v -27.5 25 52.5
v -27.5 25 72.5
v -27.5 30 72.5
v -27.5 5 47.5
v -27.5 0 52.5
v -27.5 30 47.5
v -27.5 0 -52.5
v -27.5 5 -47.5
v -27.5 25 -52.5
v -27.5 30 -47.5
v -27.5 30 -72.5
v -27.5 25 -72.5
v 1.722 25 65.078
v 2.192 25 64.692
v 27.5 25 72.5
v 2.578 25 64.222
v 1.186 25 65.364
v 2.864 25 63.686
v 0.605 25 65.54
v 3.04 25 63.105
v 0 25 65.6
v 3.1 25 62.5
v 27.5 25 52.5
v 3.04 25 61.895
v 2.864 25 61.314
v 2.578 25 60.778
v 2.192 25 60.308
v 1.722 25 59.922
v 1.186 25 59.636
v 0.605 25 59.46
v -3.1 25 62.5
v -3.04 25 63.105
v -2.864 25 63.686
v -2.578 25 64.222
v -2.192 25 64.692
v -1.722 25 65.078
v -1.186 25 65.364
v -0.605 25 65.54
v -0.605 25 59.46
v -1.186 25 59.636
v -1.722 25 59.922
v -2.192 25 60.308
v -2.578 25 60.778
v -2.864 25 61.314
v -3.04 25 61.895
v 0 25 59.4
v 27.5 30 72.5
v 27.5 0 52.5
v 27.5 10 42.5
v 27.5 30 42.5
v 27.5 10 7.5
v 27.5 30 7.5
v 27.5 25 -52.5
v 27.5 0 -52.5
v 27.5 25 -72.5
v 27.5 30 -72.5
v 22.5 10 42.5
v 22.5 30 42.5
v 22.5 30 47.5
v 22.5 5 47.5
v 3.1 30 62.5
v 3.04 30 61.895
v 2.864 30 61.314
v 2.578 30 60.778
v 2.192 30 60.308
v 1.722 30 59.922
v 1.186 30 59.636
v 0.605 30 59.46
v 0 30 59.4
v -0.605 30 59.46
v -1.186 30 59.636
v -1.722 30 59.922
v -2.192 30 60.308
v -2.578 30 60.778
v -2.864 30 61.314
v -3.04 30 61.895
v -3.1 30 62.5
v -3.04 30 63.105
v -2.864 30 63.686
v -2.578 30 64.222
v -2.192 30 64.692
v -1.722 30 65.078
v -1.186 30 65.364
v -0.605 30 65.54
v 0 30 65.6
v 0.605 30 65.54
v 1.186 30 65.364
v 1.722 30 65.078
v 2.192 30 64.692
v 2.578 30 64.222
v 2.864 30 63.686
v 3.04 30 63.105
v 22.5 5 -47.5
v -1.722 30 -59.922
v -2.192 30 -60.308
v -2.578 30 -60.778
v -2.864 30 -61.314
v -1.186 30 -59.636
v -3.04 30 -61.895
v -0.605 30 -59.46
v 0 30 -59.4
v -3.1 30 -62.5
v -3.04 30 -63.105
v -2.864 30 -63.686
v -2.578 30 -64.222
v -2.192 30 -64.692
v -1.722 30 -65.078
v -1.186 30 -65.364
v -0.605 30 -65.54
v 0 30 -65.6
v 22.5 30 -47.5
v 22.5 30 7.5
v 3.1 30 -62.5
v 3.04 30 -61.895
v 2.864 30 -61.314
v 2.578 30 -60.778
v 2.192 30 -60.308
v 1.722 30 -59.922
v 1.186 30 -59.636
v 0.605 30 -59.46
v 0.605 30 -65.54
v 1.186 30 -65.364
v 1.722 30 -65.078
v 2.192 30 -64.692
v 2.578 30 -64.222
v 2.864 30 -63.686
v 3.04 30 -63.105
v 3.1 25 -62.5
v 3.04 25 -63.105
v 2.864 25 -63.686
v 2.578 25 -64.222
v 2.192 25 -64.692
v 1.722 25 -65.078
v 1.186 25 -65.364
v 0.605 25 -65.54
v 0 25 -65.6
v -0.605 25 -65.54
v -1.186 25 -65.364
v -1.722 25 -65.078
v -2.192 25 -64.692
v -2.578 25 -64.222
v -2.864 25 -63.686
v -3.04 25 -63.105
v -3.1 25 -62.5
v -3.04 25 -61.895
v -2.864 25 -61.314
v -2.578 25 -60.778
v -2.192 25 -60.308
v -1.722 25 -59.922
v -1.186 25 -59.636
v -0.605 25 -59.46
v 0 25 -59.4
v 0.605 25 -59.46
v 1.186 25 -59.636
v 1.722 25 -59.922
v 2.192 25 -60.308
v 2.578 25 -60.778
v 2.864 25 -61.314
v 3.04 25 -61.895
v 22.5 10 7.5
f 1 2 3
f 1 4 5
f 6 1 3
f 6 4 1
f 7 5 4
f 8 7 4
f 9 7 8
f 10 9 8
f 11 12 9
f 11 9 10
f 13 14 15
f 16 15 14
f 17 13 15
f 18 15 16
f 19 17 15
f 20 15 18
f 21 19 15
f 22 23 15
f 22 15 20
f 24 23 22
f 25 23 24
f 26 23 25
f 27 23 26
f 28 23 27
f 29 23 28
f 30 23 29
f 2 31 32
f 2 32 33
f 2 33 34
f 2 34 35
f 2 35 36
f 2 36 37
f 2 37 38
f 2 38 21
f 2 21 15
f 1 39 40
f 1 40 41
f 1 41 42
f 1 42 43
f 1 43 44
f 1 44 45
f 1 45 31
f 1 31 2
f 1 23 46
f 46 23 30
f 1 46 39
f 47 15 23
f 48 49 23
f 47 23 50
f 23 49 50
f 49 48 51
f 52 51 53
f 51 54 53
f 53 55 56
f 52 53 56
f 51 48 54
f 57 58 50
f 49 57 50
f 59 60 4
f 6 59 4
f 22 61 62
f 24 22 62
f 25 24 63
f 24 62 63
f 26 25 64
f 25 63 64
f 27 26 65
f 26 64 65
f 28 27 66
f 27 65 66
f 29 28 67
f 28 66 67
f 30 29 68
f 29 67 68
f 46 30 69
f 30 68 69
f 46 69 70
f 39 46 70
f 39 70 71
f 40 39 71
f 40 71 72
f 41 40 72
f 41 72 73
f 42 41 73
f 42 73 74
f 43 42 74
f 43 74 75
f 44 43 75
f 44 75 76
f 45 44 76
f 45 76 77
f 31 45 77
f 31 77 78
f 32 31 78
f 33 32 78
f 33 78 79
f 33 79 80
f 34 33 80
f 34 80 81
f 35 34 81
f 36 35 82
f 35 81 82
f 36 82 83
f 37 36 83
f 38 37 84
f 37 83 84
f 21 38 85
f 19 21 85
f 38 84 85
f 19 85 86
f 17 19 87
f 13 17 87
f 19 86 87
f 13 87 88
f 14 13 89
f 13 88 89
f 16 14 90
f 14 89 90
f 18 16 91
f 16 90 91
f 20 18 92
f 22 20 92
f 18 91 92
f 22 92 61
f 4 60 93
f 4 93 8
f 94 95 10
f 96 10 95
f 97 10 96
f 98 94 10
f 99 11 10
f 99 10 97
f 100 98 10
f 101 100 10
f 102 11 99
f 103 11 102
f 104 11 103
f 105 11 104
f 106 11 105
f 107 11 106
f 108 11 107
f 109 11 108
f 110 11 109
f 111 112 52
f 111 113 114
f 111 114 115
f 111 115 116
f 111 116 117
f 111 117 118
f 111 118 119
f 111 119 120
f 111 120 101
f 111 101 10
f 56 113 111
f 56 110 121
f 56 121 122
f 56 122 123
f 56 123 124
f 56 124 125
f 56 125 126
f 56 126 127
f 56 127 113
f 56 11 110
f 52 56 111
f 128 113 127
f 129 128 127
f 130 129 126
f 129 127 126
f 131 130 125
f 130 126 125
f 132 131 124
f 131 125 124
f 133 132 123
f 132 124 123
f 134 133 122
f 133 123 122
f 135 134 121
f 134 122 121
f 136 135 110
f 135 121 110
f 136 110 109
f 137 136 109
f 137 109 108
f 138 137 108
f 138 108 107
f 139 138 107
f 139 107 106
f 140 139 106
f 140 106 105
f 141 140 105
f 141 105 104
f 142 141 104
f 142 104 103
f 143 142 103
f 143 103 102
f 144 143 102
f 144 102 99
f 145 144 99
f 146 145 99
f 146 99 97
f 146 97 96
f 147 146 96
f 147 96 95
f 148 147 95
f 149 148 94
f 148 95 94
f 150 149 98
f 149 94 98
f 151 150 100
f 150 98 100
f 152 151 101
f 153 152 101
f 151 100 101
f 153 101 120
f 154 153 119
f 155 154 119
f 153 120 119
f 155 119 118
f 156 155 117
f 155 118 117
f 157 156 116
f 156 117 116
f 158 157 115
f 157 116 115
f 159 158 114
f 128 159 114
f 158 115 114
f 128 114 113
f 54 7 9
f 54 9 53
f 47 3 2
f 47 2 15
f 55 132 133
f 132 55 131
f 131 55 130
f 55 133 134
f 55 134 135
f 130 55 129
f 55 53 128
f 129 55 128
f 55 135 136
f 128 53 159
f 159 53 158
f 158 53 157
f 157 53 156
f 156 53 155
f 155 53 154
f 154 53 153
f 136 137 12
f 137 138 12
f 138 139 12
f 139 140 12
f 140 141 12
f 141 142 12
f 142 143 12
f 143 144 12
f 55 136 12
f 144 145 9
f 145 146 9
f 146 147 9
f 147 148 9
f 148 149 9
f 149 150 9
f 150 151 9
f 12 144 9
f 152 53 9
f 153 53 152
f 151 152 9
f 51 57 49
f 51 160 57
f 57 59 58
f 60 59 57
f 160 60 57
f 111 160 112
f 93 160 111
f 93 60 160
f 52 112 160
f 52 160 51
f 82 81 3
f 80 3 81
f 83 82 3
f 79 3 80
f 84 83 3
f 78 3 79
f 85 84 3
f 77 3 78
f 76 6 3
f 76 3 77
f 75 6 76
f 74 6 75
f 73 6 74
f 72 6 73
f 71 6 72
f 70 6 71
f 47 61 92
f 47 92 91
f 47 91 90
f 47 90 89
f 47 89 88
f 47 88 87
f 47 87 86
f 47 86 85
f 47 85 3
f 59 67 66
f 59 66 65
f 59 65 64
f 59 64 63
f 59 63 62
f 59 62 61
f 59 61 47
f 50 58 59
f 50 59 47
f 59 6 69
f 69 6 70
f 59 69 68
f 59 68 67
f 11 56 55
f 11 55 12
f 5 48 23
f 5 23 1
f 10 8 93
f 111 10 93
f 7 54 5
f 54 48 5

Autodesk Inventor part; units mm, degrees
ref_plane "YZ Plane" through (0, 0, 0) normal (1, 0, 0) x (0, 1, 0)
ref_plane "XZ Plane" through (0, 0, 0) normal (0, 1, 0) x (-1, 0, 0)
ref_plane "XY Plane" through (0, 0, 0) normal (0, 0, 1) x (1, 0, 0)
sketch "Skizze1" plane through (0, 0, 0) normal (0, 1, 0) x (-1, 0, 0)
  line L0 (-27.5, 52.5) -> (27.5, 52.5)
  line L1 (27.5, 52.5) -> (27.5, -52.5)
  line L2 (27.5, -52.5) -> (-27.5, -52.5)
  line L3 (-27.5, -52.5) -> (-27.5, 52.5)
  line L4 (-27.5, 52.5) -> (27.5, -52.5) construction
  line L5 (27.5, 52.5) -> (-27.5, -52.5) construction
  point P0 (0, 0)
  dimension "d0" = 55
  dimension "d1" = 105
extrude "Extrusion1" add sketch "Skizze1" along normal blind 5
sketch "Skizze2" plane through (0, 5, 0) normal (0, 1, 0) x (1, 0, 0)
  line L0 (27.5, 52.5) -> (-27.5, 52.5) projected
  line L1 (-27.5, 52.5) -> (-27.5, -52.5) projected
  line L2 (-27.5, -52.5) -> (27.5, -52.5) projected
  line L3 (27.5, -52.5) -> (27.5, 52.5) projected
  line L4 (-27.5, -52.5) -> (27.5, -52.5)
  line L5 (27.5, -52.5) -> (27.5, -47.5)
  line L6 (27.5, -47.5) -> (-27.5, -47.5)
  line L7 (-27.5, -47.5) -> (-27.5, -52.5)
  line L8 (27.5, -47.5) -> (22.5, -47.5)
  line L9 (22.5, -47.5) -> (22.5, 52.5)
  line L10 (22.5, 52.5) -> (27.5, 52.5)
  line L11 (27.5, 52.5) -> (27.5, -47.5)
  line L12 (22.5, 52.5) -> (-27.5, 52.5)
  line L13 (-27.5, 52.5) -> (-27.5, 47.5)
  line L14 (-27.5, 47.5) -> (22.5, 47.5)
  line L15 (22.5, 47.5) -> (22.5, 52.5)
  point P0 (0, 0)
  dimension "d4" = 5
  dimension "d5" = 5
  dimension "d6" = 5
extrude "Extrusion2" add sketch "Skizze2" along normal blind 25 contours L3 L6 L9 L0 | L9 L14 L1 L0 | L3 L2 L1 L6
sketch "Skizze3" plane through (27.5, 0, -52.5) normal (0, 0, -1) x (-1, 0, 0)
  line L0 (0, 0) -> (55, 0) projected
  line L1 (55, 0) -> (55, 30) projected
  line L2 (0, 30) -> (55, 30) projected
  line L3 (0, 0) -> (0, 30) projected
  line L4 (55, 30) -> (0, 30)
  line L5 (0, 30) -> (0, 25)
  line L6 (0, 25) -> (55, 25)
  line L7 (55, 25) -> (55, 30)
  point P0 (27.5, 0)
  dimension "d9" = 5
extrude "Extrusion3" add sketch "Skizze3" along normal blind 20 contours L3 L2 L1 L6
sketch "Skizze4" plane through (-27.5, 0, 52.5) normal (0, 0, 1) x (1, 0, 0)
  line L0 (0, 0) -> (55, 0) projected
  line L1 (55, 0) -> (55, 30) projected
  line L2 (0, 30) -> (55, 30) projected
  line L3 (0, 0) -> (0, 30) projected
  line L4 (55, 25) -> (0, 25) projected
  line L5 (0, 30) -> (55, 30)
  line L6 (55, 30) -> (55, 25)
  line L7 (55, 25) -> (0, 25)
  line L8 (0, 25) -> (0, 30)
  point P0 (27.5, 0)
  dimension "d12" = 5
extrude "Extrusion4" add sketch "Skizze4" along normal blind 20 contours L3 L2 L1 L4
sketch "Skizze5" plane through (0, 30, 0) normal (0, 1, 0) x (1, 0, 0)
  line L0 (-27.5, -47.5) -> (-27.5, -72.5) projected
  line L1 (27.5, -72.5) -> (-27.5, -72.5) projected
  line L2 (27.5, 72.5) -> (27.5, -72.5) projected
  line L3 (-27.5, 72.5) -> (27.5, 72.5) projected
  line L4 (-27.5, 47.5) -> (-27.5, 72.5) projected
  line L5 (-27.5, 47.5) -> (22.5, 47.5) projected
  line L6 (22.5, 47.5) -> (22.5, -47.5) projected
  line L7 (22.5, -47.5) -> (-27.5, -47.5) projected
  line L8 (0, 72.5) -> (0, 62.5)
  circle A0 centre (0, 62.5) radius 3.1
  line L9 (0, -72.5) -> (0, -62.5)
  circle A1 centre (0, -62.5) radius 3.1
  point P0 (0, 0)
  dimension "d15" = 10
  dimension "d16" = 6.2
  dimension "d17" = 10
  dimension "d18" = 6.2
extrude "Extrusion5" cut sketch "Skizze5" against normal blind 20 contours A1 | A0
sketch "Skizze6" plane through (0, 30, 0) normal (0, 1, 0) x (1, 0, 0)
  circle A0 centre (0, 62.5) radius 3.1 projected
  circle A1 centre (0, -62.5) radius 3.1 projected
  line L0 (-27.5, -47.5) -> (-27.5, -72.5) projected
  line L1 (27.5, -72.5) -> (-27.5, -72.5) projected
  line L2 (27.5, 72.5) -> (27.5, -72.5) projected
  line L3 (-27.5, 72.5) -> (27.5, 72.5) projected
  line L4 (-27.5, 47.5) -> (-27.5, 72.5) projected
  line L5 (-27.5, 47.5) -> (22.5, 47.5) projected
  line L6 (22.5, 47.5) -> (22.5, -47.5) projected
  line L7 (22.5, -47.5) -> (-27.5, -47.5) projected
  line L8 (22.5, -47.5) -> (27.5, -47.5)
  line L9 (22.5, -47.5) -> (22.5, -42.5)
  line L10 (22.5, -42.5) -> (27.5, -42.5)
  line L11 (22.5, -42.5) -> (22.5, -7.5)
  line L12 (22.5, 47.5) -> (22.5, -47.5) projected
  line L13 (22.5, -7.5) -> (27.5, -7.5)
  point P0 (0, 0)
  dimension "d21" = 5
  dimension "d22" = 35
extrude "Extrusion6" cut sketch "Skizze6" against normal blind 20 contours L6 L13 L2 L10
properties part number "Hub"
